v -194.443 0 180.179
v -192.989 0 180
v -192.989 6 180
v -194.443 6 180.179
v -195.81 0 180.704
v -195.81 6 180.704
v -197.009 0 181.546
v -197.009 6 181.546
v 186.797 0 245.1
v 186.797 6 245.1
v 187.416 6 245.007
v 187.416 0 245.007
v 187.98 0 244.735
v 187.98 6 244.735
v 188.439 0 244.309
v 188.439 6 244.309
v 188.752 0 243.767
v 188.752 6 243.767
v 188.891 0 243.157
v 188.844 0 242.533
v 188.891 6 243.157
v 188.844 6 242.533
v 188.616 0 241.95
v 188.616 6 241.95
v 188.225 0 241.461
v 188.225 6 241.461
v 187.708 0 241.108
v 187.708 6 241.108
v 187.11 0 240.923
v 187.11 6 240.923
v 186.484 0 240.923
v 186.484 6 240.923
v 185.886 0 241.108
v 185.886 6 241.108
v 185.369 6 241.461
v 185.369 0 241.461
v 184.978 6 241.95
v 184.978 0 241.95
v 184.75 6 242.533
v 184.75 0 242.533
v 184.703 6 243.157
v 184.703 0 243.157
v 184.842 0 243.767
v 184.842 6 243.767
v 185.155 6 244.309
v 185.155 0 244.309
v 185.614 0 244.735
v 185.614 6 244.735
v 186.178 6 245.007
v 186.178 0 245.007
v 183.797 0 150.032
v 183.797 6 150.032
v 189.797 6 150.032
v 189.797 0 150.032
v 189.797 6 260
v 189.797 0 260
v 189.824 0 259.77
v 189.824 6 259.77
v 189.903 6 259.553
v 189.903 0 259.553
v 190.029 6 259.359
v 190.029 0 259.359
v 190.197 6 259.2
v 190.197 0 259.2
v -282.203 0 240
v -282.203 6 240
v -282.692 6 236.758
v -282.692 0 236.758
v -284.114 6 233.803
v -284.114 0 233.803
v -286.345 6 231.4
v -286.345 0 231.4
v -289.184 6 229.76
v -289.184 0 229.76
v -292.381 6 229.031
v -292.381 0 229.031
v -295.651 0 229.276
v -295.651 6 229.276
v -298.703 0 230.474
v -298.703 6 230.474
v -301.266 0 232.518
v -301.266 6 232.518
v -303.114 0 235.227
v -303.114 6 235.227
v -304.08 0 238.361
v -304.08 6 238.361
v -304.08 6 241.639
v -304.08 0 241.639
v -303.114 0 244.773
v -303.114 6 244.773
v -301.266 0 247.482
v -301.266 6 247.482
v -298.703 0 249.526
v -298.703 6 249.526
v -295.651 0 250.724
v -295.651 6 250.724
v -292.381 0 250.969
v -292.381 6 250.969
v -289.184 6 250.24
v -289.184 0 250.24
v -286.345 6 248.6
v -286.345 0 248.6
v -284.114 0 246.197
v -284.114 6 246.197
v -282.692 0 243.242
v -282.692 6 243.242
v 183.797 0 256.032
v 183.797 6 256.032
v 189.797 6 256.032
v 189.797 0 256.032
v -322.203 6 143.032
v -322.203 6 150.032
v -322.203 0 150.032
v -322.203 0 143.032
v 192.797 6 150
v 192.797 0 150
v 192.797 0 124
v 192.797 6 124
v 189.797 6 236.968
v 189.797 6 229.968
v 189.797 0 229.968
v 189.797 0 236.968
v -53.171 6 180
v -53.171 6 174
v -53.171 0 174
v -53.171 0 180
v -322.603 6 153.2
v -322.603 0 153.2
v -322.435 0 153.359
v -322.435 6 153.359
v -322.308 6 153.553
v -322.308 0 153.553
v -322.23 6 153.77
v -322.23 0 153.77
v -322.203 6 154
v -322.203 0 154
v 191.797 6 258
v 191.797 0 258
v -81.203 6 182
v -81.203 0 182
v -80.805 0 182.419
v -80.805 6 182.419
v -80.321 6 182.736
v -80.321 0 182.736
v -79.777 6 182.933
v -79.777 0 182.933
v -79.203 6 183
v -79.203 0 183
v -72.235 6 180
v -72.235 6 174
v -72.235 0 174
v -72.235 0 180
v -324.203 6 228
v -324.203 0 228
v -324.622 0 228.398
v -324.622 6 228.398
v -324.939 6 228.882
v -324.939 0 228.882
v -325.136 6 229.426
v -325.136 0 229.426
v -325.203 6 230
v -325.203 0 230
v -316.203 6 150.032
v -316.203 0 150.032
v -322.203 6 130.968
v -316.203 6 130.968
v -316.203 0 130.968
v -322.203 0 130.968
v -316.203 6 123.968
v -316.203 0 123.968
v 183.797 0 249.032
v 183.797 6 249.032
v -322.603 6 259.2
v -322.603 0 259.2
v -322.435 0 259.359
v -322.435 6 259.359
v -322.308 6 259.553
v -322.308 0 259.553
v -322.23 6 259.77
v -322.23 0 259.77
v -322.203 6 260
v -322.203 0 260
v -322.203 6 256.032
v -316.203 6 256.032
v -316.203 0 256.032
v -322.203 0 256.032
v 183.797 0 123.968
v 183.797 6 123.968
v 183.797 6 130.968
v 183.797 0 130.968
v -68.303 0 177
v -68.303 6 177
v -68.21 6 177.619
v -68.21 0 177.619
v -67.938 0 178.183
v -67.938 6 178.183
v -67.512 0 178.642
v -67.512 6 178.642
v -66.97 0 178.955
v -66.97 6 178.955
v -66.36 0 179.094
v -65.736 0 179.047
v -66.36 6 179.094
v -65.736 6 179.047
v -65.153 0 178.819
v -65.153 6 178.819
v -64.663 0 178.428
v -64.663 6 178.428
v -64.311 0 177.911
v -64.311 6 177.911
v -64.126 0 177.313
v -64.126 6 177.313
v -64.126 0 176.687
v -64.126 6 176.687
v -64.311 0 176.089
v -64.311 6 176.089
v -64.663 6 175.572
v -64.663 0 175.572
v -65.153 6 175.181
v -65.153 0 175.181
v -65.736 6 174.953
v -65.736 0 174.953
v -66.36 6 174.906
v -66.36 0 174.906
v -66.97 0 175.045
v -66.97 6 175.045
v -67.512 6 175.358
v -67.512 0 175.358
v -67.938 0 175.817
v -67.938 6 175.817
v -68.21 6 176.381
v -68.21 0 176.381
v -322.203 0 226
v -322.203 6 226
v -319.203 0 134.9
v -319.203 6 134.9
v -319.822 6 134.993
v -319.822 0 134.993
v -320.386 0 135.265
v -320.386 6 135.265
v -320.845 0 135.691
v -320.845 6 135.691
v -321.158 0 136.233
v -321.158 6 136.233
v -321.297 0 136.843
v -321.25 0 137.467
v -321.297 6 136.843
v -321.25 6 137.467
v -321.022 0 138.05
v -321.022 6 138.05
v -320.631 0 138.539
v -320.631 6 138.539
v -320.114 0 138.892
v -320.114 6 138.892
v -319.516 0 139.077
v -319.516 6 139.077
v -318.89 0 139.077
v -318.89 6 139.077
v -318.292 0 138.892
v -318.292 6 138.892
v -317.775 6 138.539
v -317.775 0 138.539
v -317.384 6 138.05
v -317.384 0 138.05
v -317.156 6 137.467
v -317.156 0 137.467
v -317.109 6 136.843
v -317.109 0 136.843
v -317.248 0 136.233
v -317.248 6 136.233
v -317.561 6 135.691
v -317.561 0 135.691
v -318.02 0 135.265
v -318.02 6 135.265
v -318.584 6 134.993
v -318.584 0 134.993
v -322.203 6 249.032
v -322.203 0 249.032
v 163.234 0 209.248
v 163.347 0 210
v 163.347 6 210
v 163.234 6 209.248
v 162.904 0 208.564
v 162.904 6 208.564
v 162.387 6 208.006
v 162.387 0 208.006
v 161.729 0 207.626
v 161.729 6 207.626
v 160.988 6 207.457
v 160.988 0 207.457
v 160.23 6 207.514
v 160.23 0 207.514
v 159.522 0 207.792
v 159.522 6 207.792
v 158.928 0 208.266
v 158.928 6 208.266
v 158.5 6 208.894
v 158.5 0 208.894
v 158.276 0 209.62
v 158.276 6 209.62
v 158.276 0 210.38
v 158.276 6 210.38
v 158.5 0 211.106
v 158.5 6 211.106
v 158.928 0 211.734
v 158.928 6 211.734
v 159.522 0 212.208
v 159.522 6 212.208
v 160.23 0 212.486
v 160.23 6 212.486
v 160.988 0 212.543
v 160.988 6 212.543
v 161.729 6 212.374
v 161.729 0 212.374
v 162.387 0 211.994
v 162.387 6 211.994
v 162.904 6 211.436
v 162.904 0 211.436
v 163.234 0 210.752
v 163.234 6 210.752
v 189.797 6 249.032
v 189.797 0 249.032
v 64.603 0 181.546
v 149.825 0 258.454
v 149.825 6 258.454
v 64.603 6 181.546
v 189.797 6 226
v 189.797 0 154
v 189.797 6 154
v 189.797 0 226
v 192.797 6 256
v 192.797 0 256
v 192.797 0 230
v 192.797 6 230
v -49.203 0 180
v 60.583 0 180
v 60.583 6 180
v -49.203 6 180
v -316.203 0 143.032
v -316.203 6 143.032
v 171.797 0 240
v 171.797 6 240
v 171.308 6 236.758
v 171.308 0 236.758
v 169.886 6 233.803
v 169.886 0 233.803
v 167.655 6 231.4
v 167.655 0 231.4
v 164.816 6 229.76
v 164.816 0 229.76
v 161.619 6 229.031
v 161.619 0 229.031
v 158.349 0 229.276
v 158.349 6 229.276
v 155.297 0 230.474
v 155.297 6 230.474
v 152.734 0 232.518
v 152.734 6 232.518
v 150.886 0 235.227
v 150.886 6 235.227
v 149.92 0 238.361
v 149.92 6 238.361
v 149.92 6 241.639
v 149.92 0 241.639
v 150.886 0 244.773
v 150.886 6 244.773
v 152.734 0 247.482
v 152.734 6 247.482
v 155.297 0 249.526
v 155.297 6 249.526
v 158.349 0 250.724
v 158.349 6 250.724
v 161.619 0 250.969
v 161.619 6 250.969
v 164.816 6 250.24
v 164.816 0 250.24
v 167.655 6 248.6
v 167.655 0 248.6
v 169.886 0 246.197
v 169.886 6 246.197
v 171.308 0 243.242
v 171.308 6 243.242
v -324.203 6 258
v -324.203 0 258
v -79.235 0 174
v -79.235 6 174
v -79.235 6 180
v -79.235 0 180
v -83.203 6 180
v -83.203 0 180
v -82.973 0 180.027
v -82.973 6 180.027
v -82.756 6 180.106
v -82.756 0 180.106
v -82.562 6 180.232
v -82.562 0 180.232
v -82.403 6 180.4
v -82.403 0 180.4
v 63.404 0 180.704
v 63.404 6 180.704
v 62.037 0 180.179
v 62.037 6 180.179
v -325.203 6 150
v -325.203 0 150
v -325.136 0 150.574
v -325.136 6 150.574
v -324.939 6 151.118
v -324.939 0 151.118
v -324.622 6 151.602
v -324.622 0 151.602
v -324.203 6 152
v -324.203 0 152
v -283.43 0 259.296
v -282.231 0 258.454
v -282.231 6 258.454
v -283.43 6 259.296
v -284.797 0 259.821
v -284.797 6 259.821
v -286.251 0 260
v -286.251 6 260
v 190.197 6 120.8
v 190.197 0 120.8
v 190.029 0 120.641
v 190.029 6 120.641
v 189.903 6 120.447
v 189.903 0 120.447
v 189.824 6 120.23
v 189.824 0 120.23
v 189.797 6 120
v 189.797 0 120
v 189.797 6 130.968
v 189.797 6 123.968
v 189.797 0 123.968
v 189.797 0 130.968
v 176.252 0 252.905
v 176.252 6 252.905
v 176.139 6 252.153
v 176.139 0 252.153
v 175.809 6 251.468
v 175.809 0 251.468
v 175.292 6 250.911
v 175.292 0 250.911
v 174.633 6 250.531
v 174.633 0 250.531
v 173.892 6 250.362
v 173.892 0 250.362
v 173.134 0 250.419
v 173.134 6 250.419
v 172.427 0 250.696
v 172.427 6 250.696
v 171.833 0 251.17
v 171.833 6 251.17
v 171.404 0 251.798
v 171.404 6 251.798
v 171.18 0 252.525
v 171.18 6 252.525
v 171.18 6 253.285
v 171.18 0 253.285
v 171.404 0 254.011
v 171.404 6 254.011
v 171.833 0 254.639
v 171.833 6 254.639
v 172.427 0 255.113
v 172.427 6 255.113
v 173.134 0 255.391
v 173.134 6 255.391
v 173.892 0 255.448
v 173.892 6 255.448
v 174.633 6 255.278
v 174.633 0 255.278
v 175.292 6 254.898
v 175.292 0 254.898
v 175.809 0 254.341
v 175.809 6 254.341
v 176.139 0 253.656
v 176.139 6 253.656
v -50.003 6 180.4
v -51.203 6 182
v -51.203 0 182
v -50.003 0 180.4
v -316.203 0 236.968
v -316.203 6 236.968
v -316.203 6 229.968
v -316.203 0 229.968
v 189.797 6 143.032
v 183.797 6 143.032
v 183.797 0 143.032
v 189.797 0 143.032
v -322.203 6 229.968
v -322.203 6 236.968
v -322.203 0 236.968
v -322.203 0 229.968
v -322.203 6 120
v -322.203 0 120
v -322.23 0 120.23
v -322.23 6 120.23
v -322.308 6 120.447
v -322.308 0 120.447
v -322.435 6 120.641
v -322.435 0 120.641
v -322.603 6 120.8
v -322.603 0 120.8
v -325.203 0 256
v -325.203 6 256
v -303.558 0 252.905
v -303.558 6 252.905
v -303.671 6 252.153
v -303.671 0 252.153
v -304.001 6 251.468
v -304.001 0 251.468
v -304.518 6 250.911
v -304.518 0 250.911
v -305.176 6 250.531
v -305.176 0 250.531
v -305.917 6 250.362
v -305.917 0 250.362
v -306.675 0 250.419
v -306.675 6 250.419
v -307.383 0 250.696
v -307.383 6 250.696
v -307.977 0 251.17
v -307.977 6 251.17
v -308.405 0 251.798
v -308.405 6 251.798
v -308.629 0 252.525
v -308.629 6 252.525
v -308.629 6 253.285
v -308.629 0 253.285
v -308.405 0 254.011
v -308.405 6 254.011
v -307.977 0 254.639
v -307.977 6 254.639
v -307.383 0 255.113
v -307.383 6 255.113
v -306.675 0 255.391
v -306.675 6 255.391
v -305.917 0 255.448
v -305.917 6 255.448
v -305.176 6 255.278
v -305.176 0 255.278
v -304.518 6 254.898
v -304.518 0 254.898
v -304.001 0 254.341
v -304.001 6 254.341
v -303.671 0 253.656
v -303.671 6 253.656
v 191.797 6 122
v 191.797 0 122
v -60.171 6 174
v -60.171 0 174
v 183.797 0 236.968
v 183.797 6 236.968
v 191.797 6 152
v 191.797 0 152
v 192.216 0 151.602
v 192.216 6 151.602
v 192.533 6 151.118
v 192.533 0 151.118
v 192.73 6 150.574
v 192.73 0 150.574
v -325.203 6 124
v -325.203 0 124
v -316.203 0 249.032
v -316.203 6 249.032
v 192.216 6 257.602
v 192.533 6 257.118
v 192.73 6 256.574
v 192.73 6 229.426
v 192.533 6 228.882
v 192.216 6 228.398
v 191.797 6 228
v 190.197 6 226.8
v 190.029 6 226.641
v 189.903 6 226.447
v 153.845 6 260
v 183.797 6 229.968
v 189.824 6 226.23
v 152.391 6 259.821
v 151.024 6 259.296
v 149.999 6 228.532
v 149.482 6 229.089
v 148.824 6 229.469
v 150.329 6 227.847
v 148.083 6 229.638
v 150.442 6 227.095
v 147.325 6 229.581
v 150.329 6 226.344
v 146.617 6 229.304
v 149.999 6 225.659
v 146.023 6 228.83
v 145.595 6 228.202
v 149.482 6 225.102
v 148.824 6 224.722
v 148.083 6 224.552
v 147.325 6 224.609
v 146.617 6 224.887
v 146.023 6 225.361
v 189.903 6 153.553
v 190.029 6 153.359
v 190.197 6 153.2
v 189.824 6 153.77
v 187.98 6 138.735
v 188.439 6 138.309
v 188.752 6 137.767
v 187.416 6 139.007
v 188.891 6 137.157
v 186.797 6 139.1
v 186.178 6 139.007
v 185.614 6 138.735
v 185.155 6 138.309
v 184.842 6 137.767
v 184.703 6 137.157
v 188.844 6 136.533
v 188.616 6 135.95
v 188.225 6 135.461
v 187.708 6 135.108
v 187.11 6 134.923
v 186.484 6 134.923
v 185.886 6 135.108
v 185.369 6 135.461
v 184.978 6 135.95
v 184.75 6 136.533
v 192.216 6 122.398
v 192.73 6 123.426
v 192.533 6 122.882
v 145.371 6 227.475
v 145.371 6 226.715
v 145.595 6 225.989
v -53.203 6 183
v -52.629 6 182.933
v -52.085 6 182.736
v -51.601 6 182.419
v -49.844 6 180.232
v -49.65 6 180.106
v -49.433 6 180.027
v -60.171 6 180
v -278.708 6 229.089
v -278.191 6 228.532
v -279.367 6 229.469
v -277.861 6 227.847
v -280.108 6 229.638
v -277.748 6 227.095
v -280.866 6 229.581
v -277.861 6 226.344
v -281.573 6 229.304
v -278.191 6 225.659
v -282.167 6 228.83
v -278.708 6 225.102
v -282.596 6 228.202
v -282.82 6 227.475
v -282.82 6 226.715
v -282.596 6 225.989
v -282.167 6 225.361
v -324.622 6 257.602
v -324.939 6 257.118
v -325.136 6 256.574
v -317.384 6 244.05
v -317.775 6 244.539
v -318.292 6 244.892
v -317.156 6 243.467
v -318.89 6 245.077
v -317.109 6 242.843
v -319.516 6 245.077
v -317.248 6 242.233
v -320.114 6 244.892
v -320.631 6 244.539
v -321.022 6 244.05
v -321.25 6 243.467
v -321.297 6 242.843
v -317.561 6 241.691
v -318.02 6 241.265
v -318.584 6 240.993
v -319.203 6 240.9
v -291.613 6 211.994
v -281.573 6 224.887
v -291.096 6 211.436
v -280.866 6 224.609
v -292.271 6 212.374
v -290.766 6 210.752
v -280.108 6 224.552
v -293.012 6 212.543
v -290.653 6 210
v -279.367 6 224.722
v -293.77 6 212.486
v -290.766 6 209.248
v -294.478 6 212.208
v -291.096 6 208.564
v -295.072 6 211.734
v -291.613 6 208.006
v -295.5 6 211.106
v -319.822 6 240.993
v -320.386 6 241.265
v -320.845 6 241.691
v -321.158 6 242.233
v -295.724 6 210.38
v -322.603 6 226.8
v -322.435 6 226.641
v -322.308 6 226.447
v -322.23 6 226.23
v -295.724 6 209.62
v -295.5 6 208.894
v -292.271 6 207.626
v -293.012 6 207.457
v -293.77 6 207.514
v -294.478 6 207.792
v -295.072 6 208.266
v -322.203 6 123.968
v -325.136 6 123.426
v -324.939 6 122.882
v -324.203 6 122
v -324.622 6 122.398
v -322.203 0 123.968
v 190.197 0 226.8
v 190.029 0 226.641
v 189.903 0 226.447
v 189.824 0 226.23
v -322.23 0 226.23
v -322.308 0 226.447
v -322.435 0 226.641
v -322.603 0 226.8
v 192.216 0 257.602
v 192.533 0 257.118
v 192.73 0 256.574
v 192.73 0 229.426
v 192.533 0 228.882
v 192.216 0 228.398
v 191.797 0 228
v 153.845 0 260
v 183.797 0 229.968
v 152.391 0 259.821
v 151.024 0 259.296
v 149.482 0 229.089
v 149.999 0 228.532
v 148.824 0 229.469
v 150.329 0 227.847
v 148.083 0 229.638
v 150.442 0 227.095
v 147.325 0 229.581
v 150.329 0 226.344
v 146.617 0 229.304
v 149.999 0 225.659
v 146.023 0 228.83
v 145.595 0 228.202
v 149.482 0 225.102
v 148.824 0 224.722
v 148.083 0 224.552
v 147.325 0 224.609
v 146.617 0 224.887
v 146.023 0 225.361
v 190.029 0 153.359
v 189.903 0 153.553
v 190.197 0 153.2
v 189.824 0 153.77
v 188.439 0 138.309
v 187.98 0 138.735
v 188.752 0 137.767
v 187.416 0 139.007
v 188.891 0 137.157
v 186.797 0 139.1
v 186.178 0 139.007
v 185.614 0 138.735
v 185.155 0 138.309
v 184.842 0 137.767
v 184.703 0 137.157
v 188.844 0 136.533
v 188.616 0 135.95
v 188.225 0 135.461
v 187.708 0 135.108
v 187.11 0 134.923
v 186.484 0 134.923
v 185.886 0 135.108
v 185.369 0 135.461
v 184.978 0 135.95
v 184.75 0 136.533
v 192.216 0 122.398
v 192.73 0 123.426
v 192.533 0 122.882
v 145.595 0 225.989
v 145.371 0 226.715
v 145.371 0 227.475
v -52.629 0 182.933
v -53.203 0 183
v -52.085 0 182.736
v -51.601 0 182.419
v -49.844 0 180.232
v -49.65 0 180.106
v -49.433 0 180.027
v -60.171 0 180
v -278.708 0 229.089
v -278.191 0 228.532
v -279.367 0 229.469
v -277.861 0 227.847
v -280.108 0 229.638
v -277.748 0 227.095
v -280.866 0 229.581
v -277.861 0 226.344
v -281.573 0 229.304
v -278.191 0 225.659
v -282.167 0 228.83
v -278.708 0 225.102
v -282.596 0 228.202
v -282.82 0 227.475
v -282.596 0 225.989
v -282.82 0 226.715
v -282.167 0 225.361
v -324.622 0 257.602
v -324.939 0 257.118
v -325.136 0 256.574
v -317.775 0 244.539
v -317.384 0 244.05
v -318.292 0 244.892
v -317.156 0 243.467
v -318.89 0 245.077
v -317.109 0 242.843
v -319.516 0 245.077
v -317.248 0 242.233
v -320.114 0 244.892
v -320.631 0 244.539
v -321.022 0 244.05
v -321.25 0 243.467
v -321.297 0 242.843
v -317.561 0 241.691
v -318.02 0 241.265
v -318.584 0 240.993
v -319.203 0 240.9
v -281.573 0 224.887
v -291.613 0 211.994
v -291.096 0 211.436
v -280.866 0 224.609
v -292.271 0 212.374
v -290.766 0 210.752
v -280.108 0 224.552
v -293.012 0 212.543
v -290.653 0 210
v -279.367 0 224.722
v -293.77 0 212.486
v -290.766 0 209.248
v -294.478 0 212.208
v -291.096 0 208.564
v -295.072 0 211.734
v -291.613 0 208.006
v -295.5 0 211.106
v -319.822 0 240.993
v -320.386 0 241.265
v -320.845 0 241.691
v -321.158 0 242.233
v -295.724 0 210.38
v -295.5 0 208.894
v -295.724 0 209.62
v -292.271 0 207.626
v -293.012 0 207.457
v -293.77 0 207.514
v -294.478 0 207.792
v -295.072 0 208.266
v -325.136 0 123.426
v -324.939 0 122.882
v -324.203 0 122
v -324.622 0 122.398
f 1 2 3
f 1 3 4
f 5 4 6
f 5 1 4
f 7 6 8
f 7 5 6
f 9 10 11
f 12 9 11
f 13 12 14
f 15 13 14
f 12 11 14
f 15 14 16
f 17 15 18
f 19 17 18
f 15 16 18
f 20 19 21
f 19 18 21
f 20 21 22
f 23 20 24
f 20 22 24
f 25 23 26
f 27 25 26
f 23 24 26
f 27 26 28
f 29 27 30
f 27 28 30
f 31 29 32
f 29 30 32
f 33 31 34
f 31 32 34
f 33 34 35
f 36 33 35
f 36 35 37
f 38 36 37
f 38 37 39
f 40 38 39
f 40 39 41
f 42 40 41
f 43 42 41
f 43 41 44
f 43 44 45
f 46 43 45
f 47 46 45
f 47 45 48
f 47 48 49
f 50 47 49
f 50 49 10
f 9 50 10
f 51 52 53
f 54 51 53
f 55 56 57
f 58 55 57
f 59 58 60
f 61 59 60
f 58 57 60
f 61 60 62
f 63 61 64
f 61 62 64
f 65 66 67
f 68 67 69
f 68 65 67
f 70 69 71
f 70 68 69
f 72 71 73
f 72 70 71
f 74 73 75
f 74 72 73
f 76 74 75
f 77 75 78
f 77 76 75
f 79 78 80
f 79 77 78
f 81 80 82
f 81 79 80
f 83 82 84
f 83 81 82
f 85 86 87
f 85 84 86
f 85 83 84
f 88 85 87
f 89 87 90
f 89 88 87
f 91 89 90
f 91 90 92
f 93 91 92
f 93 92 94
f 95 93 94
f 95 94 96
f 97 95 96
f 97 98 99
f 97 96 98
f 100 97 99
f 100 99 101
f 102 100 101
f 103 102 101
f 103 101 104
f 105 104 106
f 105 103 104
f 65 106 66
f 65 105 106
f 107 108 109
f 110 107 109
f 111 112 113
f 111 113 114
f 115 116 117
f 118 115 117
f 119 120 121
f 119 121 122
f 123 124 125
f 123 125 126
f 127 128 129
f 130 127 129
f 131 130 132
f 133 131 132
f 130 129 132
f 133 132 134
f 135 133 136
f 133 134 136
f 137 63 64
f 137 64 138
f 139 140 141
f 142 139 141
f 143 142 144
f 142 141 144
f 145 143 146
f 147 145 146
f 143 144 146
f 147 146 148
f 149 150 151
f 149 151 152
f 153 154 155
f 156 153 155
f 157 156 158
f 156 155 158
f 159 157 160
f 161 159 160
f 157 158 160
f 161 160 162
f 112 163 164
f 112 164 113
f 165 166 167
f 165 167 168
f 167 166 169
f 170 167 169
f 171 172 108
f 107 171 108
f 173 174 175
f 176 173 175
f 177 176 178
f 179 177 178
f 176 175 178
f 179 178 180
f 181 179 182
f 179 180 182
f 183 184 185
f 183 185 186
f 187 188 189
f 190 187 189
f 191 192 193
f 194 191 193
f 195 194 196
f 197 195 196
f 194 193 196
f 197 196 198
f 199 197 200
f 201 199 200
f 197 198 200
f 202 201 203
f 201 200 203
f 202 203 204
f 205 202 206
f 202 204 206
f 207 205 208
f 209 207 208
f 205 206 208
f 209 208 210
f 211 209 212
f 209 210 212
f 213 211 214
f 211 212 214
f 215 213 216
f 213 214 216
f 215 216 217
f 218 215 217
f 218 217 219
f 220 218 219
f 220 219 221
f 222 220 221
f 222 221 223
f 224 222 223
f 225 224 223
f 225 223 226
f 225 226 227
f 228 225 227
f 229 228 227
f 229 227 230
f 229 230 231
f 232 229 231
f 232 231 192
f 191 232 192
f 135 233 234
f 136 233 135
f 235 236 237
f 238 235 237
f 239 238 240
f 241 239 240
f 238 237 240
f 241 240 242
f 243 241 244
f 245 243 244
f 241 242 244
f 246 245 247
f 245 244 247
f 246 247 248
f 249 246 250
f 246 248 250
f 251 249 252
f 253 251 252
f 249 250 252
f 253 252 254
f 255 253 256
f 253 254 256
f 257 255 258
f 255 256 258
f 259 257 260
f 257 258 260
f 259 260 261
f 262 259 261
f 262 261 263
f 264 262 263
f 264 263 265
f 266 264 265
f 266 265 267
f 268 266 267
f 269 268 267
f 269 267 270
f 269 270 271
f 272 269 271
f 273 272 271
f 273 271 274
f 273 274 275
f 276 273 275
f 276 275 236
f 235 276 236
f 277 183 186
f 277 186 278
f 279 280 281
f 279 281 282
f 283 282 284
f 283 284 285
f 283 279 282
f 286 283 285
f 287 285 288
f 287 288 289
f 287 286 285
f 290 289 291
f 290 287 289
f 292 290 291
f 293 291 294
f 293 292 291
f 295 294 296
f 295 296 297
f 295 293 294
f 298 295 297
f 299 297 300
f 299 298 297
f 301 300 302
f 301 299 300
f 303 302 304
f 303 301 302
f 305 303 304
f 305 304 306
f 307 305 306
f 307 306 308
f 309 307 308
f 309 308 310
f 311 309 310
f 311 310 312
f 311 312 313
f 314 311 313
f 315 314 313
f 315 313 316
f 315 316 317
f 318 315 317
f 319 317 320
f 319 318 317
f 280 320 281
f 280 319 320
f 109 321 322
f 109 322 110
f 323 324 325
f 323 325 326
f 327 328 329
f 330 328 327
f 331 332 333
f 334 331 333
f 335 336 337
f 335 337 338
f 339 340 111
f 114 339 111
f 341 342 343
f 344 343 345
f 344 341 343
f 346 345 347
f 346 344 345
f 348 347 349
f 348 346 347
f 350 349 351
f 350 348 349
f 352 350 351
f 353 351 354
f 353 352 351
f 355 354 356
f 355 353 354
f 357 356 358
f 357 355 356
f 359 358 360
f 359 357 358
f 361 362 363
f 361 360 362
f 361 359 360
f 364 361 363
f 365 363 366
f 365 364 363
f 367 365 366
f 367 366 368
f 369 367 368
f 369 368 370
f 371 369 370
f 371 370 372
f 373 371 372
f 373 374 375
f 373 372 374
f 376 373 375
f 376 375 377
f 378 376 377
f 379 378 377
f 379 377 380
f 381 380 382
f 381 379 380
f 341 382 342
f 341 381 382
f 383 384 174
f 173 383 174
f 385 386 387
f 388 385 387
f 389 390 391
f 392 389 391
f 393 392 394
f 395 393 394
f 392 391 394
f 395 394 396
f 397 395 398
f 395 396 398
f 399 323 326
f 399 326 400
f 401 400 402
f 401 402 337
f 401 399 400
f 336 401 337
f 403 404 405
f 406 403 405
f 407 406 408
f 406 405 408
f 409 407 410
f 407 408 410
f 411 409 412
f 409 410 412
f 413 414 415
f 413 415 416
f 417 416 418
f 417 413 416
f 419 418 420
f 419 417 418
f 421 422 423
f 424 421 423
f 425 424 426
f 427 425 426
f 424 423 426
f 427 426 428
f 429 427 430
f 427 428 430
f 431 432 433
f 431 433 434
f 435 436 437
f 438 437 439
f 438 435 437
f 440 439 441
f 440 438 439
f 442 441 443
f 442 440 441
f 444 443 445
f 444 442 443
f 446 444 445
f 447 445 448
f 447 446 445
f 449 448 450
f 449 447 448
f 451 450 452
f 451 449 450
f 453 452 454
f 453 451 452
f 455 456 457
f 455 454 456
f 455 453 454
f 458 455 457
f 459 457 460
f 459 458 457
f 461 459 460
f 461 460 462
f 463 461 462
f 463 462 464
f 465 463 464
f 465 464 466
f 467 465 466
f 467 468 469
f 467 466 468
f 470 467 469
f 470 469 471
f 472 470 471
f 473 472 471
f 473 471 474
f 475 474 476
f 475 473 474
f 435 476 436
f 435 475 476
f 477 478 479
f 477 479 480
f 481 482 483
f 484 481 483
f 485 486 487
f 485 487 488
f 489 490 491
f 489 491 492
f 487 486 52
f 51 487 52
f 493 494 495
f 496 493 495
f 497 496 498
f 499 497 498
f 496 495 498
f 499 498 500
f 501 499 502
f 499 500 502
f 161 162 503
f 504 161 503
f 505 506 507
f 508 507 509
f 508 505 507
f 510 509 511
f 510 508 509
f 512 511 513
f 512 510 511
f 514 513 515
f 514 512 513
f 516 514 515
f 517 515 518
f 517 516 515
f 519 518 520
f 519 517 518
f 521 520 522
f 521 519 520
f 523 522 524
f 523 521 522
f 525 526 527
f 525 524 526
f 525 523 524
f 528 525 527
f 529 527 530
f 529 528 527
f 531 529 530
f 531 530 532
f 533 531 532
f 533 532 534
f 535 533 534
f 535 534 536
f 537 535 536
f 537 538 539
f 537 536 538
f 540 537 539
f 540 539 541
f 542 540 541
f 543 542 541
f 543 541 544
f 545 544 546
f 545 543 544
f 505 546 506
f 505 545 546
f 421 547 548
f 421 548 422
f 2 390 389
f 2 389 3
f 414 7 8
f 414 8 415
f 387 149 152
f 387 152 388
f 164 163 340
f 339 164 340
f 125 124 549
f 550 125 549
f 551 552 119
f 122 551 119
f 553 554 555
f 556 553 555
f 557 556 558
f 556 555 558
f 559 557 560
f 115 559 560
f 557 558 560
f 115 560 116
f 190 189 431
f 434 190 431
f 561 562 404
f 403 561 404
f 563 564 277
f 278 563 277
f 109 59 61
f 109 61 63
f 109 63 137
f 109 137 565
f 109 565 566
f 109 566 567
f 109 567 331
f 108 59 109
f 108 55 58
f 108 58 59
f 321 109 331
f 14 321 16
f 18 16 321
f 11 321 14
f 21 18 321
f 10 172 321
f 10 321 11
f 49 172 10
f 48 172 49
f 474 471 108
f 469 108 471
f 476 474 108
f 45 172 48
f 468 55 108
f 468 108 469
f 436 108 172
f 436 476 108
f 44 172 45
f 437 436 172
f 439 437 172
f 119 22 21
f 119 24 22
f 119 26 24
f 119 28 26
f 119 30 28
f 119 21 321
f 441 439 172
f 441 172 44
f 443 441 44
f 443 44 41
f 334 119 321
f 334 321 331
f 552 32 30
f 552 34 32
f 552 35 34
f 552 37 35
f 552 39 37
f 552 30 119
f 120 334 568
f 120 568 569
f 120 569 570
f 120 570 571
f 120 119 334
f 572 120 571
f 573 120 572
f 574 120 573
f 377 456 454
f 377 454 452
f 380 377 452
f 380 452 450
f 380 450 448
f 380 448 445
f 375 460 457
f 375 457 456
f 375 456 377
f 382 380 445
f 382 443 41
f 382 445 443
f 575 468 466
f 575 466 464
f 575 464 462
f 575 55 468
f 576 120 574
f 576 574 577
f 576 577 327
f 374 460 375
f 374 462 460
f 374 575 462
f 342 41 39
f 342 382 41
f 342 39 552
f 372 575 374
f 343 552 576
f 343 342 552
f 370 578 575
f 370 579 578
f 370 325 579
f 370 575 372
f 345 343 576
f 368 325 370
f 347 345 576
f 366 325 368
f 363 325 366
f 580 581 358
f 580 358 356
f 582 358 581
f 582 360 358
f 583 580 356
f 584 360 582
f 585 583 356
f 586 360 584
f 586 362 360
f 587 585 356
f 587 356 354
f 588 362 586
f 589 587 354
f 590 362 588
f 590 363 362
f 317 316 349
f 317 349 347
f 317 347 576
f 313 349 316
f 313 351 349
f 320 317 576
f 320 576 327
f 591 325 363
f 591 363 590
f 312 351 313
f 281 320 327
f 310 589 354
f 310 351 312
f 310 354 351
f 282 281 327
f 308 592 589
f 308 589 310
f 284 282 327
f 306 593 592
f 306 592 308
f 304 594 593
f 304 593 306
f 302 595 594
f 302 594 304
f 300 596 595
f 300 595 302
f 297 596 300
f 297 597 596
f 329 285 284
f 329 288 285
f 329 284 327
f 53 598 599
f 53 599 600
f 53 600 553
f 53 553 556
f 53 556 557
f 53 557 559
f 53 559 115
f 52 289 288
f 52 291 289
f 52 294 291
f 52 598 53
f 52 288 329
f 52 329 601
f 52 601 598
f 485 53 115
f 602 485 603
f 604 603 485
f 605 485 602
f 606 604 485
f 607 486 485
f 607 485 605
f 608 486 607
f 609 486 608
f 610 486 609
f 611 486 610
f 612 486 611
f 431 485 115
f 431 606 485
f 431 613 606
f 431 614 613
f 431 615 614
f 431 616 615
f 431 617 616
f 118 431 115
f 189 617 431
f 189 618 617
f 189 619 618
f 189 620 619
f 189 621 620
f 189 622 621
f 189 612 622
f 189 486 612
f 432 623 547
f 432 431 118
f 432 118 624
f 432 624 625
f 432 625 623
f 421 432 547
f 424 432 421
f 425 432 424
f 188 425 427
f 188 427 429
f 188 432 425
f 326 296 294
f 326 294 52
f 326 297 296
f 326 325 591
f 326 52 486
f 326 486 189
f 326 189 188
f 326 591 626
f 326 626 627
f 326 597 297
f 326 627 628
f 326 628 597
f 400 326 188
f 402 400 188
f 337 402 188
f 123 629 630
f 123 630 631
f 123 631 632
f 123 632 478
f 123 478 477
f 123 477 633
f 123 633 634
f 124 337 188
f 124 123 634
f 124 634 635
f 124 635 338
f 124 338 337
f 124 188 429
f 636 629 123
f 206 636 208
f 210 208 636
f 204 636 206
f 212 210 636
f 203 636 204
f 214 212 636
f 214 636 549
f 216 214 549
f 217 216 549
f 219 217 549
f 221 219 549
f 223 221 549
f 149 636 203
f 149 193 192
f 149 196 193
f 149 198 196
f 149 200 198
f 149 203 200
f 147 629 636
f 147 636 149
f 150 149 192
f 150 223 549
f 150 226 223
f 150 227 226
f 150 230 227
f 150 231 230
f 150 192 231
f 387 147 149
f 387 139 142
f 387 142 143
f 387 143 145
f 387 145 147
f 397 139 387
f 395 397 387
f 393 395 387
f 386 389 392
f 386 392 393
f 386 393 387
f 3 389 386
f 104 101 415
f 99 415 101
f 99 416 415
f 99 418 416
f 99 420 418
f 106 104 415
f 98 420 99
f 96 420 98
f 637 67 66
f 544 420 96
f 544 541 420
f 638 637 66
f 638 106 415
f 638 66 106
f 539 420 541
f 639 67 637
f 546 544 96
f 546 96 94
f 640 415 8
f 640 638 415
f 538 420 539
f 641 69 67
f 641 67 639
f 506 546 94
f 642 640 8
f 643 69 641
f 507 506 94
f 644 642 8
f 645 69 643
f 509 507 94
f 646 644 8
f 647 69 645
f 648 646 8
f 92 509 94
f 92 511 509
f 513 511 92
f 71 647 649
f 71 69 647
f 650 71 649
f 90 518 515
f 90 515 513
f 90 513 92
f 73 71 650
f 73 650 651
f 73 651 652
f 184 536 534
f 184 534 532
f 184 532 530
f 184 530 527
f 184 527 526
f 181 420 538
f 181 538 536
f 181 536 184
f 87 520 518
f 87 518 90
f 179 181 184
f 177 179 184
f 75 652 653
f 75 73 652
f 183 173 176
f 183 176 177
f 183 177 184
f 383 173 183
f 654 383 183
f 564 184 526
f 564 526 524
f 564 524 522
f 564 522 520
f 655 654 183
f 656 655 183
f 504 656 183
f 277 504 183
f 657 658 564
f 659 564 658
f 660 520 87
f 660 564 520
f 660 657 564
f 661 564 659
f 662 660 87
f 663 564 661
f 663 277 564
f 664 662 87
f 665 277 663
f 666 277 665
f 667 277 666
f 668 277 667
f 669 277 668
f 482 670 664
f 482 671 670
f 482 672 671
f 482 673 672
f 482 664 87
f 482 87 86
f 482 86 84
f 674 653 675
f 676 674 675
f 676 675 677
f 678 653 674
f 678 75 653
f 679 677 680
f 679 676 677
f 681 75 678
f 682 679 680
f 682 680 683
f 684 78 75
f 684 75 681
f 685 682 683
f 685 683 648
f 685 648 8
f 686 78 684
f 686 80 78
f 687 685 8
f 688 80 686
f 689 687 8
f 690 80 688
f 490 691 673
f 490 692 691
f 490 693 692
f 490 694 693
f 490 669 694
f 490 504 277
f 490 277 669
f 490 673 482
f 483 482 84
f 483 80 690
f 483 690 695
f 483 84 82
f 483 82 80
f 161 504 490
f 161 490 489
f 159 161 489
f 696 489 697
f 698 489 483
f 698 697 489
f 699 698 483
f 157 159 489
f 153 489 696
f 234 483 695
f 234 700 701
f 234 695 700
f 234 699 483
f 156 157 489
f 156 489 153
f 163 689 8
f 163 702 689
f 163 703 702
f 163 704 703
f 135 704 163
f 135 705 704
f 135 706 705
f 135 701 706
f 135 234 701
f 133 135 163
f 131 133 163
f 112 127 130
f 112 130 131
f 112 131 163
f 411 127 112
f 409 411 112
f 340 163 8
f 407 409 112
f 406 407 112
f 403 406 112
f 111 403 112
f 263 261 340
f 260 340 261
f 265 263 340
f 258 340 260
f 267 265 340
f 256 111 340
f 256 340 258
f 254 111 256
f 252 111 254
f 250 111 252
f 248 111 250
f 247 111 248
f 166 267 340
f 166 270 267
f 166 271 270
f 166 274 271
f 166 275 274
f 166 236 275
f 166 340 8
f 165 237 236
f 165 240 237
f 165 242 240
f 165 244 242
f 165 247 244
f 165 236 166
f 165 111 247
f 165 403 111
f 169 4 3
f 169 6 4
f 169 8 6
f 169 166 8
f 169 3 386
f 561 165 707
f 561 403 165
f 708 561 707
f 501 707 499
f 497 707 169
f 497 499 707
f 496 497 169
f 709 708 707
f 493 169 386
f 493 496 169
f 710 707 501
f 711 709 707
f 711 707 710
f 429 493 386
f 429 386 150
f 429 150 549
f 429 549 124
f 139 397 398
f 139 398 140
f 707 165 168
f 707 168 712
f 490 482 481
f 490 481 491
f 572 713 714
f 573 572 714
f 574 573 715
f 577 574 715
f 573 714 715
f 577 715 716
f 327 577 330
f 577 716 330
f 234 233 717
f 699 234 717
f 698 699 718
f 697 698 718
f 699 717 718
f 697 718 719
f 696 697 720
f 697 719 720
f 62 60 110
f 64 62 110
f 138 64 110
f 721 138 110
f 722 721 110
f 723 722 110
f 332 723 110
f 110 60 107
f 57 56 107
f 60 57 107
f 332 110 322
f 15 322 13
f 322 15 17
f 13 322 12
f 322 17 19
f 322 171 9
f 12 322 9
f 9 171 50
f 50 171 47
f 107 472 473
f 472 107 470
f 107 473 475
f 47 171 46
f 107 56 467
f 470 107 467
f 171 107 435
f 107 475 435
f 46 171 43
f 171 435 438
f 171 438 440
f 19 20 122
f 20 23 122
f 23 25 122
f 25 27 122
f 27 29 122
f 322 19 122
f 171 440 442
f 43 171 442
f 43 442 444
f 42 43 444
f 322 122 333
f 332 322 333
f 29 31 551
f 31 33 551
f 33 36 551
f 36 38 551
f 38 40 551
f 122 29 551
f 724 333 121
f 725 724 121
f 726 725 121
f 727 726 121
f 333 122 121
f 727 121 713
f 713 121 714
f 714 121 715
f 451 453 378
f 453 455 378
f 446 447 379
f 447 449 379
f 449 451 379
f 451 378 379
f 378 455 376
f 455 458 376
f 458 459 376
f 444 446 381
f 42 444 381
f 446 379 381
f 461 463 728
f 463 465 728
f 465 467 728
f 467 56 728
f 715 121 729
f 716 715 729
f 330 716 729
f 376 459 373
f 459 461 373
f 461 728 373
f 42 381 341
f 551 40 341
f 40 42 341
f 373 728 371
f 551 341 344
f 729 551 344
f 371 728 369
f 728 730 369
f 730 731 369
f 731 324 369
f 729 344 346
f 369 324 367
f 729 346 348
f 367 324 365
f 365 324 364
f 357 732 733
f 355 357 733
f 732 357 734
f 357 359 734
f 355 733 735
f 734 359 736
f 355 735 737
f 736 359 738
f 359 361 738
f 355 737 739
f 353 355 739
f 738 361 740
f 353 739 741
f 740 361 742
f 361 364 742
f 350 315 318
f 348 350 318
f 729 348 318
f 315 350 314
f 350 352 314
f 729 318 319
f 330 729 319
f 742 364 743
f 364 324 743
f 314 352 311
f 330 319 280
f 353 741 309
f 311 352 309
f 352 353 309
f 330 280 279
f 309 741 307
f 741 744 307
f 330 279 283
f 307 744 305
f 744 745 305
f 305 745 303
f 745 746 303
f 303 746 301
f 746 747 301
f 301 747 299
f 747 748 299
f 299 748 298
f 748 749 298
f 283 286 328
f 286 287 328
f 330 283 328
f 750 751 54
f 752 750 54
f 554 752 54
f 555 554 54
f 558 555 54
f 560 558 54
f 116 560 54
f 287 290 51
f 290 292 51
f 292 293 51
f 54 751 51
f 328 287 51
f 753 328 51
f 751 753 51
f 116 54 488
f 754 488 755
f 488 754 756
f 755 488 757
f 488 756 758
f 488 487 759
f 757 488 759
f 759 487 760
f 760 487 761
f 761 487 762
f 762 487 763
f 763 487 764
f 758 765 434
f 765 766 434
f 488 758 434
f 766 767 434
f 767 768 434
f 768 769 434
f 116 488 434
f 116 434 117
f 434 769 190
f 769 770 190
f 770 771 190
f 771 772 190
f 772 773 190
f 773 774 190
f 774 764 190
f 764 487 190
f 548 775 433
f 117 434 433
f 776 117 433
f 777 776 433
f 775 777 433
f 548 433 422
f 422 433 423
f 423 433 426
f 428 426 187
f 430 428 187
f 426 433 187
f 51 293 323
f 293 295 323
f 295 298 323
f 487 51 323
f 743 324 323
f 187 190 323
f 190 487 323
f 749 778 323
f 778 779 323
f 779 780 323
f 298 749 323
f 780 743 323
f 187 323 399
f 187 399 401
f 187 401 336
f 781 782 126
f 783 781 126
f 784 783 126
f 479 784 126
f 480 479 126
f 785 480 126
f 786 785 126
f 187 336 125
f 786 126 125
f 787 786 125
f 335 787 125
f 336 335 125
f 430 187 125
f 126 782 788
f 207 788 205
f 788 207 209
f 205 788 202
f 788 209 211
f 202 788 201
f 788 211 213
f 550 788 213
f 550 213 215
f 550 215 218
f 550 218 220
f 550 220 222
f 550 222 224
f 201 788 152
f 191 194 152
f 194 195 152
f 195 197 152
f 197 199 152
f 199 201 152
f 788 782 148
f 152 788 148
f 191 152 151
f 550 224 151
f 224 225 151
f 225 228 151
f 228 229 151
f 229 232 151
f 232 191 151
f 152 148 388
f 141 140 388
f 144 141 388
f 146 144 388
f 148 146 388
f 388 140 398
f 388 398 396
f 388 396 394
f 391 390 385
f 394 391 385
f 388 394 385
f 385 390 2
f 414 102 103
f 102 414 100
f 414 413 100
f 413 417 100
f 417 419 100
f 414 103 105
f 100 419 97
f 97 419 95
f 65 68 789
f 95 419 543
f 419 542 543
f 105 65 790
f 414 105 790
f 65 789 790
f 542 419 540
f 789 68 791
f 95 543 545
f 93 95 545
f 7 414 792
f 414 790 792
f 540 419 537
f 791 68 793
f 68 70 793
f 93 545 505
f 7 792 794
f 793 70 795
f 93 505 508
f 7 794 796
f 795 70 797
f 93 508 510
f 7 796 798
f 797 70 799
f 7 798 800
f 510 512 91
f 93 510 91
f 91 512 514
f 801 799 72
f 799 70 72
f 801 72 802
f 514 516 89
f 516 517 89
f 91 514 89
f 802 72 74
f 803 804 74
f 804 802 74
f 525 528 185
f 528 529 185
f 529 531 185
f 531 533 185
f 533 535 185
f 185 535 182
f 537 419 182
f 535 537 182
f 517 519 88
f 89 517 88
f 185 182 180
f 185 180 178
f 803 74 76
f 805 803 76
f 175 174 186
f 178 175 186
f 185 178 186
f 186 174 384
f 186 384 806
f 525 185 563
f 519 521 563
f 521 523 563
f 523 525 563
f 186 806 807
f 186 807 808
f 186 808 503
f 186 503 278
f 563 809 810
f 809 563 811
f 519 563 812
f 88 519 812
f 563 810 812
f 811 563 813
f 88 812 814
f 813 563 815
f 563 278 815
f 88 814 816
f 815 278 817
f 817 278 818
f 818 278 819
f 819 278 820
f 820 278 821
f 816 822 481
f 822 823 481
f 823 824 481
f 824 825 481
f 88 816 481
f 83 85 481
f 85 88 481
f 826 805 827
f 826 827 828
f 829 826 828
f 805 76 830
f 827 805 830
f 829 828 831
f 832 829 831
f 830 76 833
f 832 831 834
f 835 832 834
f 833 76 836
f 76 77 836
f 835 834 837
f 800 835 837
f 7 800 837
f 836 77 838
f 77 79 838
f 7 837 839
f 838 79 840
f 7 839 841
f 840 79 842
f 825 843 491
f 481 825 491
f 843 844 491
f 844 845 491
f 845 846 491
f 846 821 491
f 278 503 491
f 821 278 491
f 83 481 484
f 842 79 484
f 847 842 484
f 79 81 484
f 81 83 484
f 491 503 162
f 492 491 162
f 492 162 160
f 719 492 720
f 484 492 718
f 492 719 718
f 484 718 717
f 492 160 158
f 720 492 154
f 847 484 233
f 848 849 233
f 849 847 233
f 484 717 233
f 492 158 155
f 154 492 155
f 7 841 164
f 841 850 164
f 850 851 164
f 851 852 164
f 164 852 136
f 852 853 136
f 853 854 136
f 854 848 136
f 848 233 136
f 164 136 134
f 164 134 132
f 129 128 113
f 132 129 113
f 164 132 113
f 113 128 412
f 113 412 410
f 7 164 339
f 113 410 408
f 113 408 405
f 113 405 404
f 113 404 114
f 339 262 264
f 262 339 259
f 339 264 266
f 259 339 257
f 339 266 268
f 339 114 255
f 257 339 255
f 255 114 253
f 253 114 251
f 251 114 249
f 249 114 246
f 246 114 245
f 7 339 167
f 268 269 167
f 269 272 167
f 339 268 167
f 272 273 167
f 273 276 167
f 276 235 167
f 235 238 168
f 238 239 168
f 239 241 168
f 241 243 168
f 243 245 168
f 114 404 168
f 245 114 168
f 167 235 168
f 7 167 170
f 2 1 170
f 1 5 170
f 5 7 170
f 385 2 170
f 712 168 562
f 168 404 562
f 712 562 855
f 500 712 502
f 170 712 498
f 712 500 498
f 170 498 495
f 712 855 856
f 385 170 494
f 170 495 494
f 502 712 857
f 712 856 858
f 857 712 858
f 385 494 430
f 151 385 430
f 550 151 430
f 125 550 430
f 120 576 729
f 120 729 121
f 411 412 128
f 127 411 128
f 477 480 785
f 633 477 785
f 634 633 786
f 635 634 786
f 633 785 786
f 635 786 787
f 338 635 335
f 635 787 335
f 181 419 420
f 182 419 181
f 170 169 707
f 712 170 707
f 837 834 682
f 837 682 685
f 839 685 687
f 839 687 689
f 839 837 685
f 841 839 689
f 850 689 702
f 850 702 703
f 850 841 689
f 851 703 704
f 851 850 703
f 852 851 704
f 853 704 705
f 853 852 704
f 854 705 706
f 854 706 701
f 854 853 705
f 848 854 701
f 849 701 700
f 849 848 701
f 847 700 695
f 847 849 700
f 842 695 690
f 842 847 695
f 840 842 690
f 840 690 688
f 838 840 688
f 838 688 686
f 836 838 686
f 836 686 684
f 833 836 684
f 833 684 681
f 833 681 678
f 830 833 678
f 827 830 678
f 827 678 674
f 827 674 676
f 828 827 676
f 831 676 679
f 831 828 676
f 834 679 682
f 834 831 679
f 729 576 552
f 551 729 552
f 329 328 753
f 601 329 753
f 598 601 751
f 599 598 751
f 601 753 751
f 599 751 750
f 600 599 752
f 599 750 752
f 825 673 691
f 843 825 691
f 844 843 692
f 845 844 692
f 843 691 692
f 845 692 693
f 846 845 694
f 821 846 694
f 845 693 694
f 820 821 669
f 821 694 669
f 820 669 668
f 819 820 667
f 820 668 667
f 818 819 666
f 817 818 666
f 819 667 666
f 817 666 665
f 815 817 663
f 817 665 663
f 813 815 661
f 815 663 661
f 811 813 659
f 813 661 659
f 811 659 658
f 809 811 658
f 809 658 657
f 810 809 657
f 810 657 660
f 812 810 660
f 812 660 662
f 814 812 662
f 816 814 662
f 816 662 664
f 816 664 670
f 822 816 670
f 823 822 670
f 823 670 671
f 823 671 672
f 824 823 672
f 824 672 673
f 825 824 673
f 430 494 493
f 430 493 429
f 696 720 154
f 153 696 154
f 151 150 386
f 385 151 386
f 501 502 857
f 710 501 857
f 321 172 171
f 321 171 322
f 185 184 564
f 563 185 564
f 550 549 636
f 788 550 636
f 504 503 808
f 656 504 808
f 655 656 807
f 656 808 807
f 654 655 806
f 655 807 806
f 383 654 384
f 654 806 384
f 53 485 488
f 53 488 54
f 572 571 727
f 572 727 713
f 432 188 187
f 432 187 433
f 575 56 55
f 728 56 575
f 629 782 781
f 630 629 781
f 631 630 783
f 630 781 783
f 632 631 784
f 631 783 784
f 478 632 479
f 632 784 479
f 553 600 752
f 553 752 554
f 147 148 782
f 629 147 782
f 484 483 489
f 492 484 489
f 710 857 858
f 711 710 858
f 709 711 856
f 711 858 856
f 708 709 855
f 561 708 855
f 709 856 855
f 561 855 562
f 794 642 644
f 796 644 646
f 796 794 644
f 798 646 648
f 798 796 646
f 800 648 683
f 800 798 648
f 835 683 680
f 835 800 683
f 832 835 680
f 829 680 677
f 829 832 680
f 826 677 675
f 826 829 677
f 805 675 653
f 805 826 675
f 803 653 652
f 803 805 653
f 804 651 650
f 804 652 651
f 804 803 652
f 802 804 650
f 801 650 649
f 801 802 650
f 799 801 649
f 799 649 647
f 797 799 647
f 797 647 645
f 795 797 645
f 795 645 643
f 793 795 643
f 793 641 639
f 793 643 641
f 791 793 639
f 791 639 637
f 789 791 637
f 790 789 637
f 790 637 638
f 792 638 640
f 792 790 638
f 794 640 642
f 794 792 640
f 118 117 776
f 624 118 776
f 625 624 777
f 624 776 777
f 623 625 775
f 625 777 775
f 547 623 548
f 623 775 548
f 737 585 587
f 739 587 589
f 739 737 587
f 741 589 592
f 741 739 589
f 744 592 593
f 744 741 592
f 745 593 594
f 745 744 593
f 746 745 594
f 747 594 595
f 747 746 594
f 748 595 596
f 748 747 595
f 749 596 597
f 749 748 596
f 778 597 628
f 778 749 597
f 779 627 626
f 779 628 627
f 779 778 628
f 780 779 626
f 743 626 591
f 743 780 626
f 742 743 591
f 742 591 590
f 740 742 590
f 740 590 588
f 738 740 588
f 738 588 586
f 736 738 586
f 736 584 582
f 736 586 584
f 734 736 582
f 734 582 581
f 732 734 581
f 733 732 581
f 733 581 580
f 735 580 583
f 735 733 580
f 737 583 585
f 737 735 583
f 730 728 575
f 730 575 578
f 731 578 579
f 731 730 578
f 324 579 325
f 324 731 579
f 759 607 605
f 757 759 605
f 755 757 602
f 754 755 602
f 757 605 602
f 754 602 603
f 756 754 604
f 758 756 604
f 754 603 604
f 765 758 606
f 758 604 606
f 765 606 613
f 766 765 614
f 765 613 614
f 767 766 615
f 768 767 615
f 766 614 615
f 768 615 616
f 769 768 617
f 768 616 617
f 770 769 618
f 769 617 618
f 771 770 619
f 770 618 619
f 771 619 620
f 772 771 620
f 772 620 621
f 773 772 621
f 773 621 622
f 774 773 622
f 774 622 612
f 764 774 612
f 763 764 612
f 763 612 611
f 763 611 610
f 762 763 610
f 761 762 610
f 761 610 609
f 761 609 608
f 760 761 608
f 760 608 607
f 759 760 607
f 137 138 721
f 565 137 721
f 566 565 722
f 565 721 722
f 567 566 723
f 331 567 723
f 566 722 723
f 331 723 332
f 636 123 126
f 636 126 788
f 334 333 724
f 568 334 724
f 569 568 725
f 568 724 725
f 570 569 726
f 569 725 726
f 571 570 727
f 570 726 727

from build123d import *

# Parameters (mm, degrees)
SKETCH_1_R               = 2.55
EXTRUDE_1_DEPTH          = 6
SKETCH_7_R               = 11
SKETCH_7_R_2             = 2.55
CUT_EXTRUDE_1_DEPTH      = 14
CUT_EXTRUDE_1_DEPTH_BACK = 5
SKETCH_8_R               = 11
SKETCH_8_R_2             = 2.55
CUT_EXTRUDE_2_DEPTH      = 11
CUT_EXTRUDE_2_DEPTH_BACK = 5
EXTRUDE_2_DEPTH          = 6
SKETCH_3_R               = 2.1
SKETCH_3_W               = 7
SKETCH_3_H               = 6
CUT_EXTRUDE_12_DEPTH     = 7
EXTRUDE_21_DEPTH         = 6
SKETCH_31_R              = 2.1
SKETCH_31_W              = 7
SKETCH_31_H              = 6
CUT_EXTRUDE_13_DEPTH     = 7
EXTRUDE_22_DEPTH         = 6
SKETCH_32_R              = 2.1
SKETCH_32_W              = 7
SKETCH_32_H              = 6
CUT_EXTRUDE_14_DEPTH     = 7
EXTRUDE_23_DEPTH         = 6
SKETCH_33_R              = 2.1
SKETCH_33_W              = 7
SKETCH_33_H              = 6
CUT_EXTRUDE_15_DEPTH     = 7
EXTRUDE_24_DEPTH         = 6
SKETCH_34_R              = 2.1
SKETCH_34_W              = 7
SKETCH_34_H              = 6
CUT_EXTRUDE_16_DEPTH     = 7


with BuildPart() as part:
    # Эскиз1 → Бобышка-Вытянуть1 (new body)
    with BuildSketch(Plane(origin=(0, 0, 0), x_dir=(1, 0, 0), z_dir=(0, 1, 0))):
        with BuildLine():
            Line((-322.202898551, -260), (-322.202898551, -120))
            Line((-322.202898551, -120), (189.797101449, -120))
            Line((189.797101449, -120), (189.797101449, -260))
            Line((189.797101449, -260), (153.844946536, -260))
            ThreePointArc((153.844946536, -260), (151.691579542, -259.600268796), (149.825135208, -258.454336863))
            Line((149.825135208, -258.454336863), (64.602941314, -181.545663137))
            ThreePointArc((64.602941314, -181.545663137), (62.73649698, -180.399731204), (60.583129986, -180))
            Line((60.583129986, -180), (-192.988927088, -180))
            ThreePointArc((-192.988927088, -180), (-195.142294082, -180.399731204), (-197.008738416, -181.545663137))
            Line((-197.008738416, -181.545663137), (-282.230932309, -258.454336863))
            ThreePointArc((-282.230932309, -258.454336863), (-284.097376643, -259.600268796), (-286.250743637, -260))
            Line((-286.250743637, -260), (-322.202898551, -260))
        make_face()
        with Locations((-293.202898551, -210)):
            Circle(SKETCH_1_R, mode=Mode.SUBTRACT)
        with Locations((160.797101449, -210)):
            Circle(SKETCH_1_R, mode=Mode.SUBTRACT)
    extrude(amount=EXTRUDE_1_DEPTH)

    # Эскиз7 → Вырез-Вытянуть1 (cut, two sides)
    with BuildSketch(Plane(origin=(0, 0, 0), x_dir=(1, 0, 0), z_dir=(0, 1, 0))) as cut_extrude_1_sk:
        with Locations((-293.202898551, -240)):
            Circle(SKETCH_7_R)
        with Locations((-280.298199794, -227.095301243)):
            Circle(SKETCH_7_R_2)
        with Locations((-306.107597307, -252.904698757)):
            Circle(SKETCH_7_R_2)
    extrude(amount=CUT_EXTRUDE_1_DEPTH, mode=Mode.SUBTRACT)
    extrude(cut_extrude_1_sk.sketch, amount=-CUT_EXTRUDE_1_DEPTH_BACK, mode=Mode.SUBTRACT)

    # Эскиз8 → Вырез-Вытянуть2 (cut, two sides)
    with BuildSketch(Plane(origin=(0, 0, 0), x_dir=(1, 0, 0), z_dir=(0, 1, 0))) as cut_extrude_2_sk:
        with Locations((160.797101449, -240)):
            Circle(SKETCH_8_R)
        with Locations((147.892402692, -227.095301243)):
            Circle(SKETCH_8_R_2)
        with Locations((173.701800206, -252.904698757)):
            Circle(SKETCH_8_R_2)
    extrude(amount=CUT_EXTRUDE_2_DEPTH, mode=Mode.SUBTRACT)
    extrude(cut_extrude_2_sk.sketch, amount=-CUT_EXTRUDE_2_DEPTH_BACK, mode=Mode.SUBTRACT)

    # Эскиз2 → Бобышка-Вытянуть2 (add)
    with BuildSketch(Plane(origin=(139.797101449, 0, 243), x_dir=(0, 0, 1), z_dir=(0, 1, 0))):
        with BuildLine():
            Line((13, 53), (-13, 53))
            ThreePointArc((-13, 53), (-14.118033989, 52.736067977), (-15, 52))
            Line((-15, 52), (-16.2, 50.4))
            ThreePointArc((-16.2, 50.4), (-16.552786405, 50.105572809), (-17, 50))
            Line((-17, 50), (17, 50))
            ThreePointArc((17, 50), (16.552786405, 50.105572809), (16.2, 50.4))
            Line((16.2, 50.4), (15, 52))
            ThreePointArc((15, 52), (14.118033989, 52.736067977), (13, 53))
        make_face()
    extrude(amount=EXTRUDE_2_DEPTH)

    # Эскиз3 → Вырез-Вытянуть12 (cut, through all)
    with BuildSketch(Plane(origin=(139.797101449, 6, 243), x_dir=(0, 0, 1), z_dir=(0, 1, 0))):
        with Locations((0, 47)):
            Circle(SKETCH_3_R)
        with Locations((9.531849908, 47)):
            Rectangle(SKETCH_3_W, SKETCH_3_H)
        with Locations((-9.531849908, 47)):
            Rectangle(SKETCH_3_W, SKETCH_3_H)
    extrude(amount=-CUT_EXTRUDE_12_DEPTH, mode=Mode.SUBTRACT)

    # Эскиз21 → Бобышка-Вытянуть21 (add)
    with BuildSketch(Plane(origin=(139.797101449, 0, 137), x_dir=(0, 0, 1), z_dir=(0, 1, 0))):
        with BuildLine():
            Line((13, 53), (-13, 53))
            ThreePointArc((-13, 53), (-14.118033989, 52.736067977), (-15, 52))
            Line((-15, 52), (-16.2, 50.4))
            ThreePointArc((-16.2, 50.4), (-16.552786405, 50.105572809), (-17, 50))
            Line((-17, 50), (17, 50))
            ThreePointArc((17, 50), (16.552786405, 50.105572809), (16.2, 50.4))
            Line((16.2, 50.4), (15, 52))
            ThreePointArc((15, 52), (14.118033989, 52.736067977), (13, 53))
        make_face()
    extrude(amount=EXTRUDE_21_DEPTH)

    # Эскиз31 → Вырез-Вытянуть13 (cut, through all)
    with BuildSketch(Plane(origin=(139.797101449, 6, 137), x_dir=(0, 0, 1), z_dir=(0, 1, 0))):
        with Locations((0, 47)):
            Circle(SKETCH_31_R)
        with Locations((9.531849908, 47)):
            Rectangle(SKETCH_31_W, SKETCH_31_H)
        with Locations((-9.531849908, 47)):
            Rectangle(SKETCH_31_W, SKETCH_31_H)
    extrude(amount=-CUT_EXTRUDE_13_DEPTH, mode=Mode.SUBTRACT)

    # Эскиз22 → Бобышка-Вытянуть22 (add)
    with BuildSketch(Plane(origin=(-272.202898551, 0, 243), x_dir=(0, 0, -1), z_dir=(0, 1, 0))):
        with BuildLine():
            Line((13, 53), (-13, 53))
            ThreePointArc((-13, 53), (-14.118033989, 52.736067977), (-15, 52))
            Line((-15, 52), (-16.2, 50.4))
            ThreePointArc((-16.2, 50.4), (-16.552786405, 50.105572809), (-17, 50))
            Line((-17, 50), (17, 50))
            ThreePointArc((17, 50), (16.552786405, 50.105572809), (16.2, 50.4))
            Line((16.2, 50.4), (15, 52))
            ThreePointArc((15, 52), (14.118033989, 52.736067977), (13, 53))
        make_face()
    extrude(amount=EXTRUDE_22_DEPTH)

    # Эскиз32 → Вырез-Вытянуть14 (cut, through all)
    with BuildSketch(Plane(origin=(-272.202898551, 6, 243), x_dir=(0, 0, -1), z_dir=(0, 1, 0))):
        with Locations((0, 47)):
            Circle(SKETCH_32_R)
        with Locations((9.531849908, 47)):
            Rectangle(SKETCH_32_W, SKETCH_32_H)
        with Locations((-9.531849908, 47)):
            Rectangle(SKETCH_32_W, SKETCH_32_H)
    extrude(amount=-CUT_EXTRUDE_14_DEPTH, mode=Mode.SUBTRACT)

    # Эскиз23 → Бобышка-Вытянуть23 (add)
    with BuildSketch(Plane(origin=(-272.202898551, 0, 137), x_dir=(0, 0, -1), z_dir=(0, 1, 0))):
        with BuildLine():
            Line((13, 53), (-13, 53))
            ThreePointArc((-13, 53), (-14.118033989, 52.736067977), (-15, 52))
            Line((-15, 52), (-16.2, 50.4))
            ThreePointArc((-16.2, 50.4), (-16.552786405, 50.105572809), (-17, 50))
            Line((-17, 50), (17, 50))
            ThreePointArc((17, 50), (16.552786405, 50.105572809), (16.2, 50.4))
            Line((16.2, 50.4), (15, 52))
            ThreePointArc((15, 52), (14.118033989, 52.736067977), (13, 53))
        make_face()
    extrude(amount=EXTRUDE_23_DEPTH)

    # Эскиз33 → Вырез-Вытянуть15 (cut, through all)
    with BuildSketch(Plane(origin=(-272.202898551, 6, 137), x_dir=(0, 0, -1), z_dir=(0, 1, 0))):
        with Locations((0, 47)):
            Circle(SKETCH_33_R)
        with Locations((9.531849908, 47)):
            Rectangle(SKETCH_33_W, SKETCH_33_H)
        with Locations((-9.531849908, 47)):
            Rectangle(SKETCH_33_W, SKETCH_33_H)
    extrude(amount=-CUT_EXTRUDE_15_DEPTH, mode=Mode.SUBTRACT)

    # Эскиз24 → Бобышка-Вытянуть24 (add)
    with BuildSketch(Plane(origin=(-66.202898551, 0, 130), x_dir=(-1, 0, 0), z_dir=(0, 1, 0))):
        with BuildLine():
            Line((13, 53), (-13, 53))
            ThreePointArc((-13, 53), (-14.118033989, 52.736067977), (-15, 52))
            Line((-15, 52), (-16.2, 50.4))
            ThreePointArc((-16.2, 50.4), (-16.552786405, 50.105572809), (-17, 50))
            Line((-17, 50), (17, 50))
            ThreePointArc((17, 50), (16.552786405, 50.105572809), (16.2, 50.4))
            Line((16.2, 50.4), (15, 52))
            ThreePointArc((15, 52), (14.118033989, 52.736067977), (13, 53))
        make_face()
    extrude(amount=EXTRUDE_24_DEPTH)

    # Эскиз34 → Вырез-Вытянуть16 (cut, through all)
    with BuildSketch(Plane(origin=(-66.202898551, 6, 130), x_dir=(-1, 0, 0), z_dir=(0, 1, 0))):
        with Locations((0, 47)):
            Circle(SKETCH_34_R)
        with Locations((9.531849908, 47)):
            Rectangle(SKETCH_34_W, SKETCH_34_H)
        with Locations((-9.531849908, 47)):
            Rectangle(SKETCH_34_W, SKETCH_34_H)
    extrude(amount=-CUT_EXTRUDE_16_DEPTH, mode=Mode.SUBTRACT)


solid = part.part
